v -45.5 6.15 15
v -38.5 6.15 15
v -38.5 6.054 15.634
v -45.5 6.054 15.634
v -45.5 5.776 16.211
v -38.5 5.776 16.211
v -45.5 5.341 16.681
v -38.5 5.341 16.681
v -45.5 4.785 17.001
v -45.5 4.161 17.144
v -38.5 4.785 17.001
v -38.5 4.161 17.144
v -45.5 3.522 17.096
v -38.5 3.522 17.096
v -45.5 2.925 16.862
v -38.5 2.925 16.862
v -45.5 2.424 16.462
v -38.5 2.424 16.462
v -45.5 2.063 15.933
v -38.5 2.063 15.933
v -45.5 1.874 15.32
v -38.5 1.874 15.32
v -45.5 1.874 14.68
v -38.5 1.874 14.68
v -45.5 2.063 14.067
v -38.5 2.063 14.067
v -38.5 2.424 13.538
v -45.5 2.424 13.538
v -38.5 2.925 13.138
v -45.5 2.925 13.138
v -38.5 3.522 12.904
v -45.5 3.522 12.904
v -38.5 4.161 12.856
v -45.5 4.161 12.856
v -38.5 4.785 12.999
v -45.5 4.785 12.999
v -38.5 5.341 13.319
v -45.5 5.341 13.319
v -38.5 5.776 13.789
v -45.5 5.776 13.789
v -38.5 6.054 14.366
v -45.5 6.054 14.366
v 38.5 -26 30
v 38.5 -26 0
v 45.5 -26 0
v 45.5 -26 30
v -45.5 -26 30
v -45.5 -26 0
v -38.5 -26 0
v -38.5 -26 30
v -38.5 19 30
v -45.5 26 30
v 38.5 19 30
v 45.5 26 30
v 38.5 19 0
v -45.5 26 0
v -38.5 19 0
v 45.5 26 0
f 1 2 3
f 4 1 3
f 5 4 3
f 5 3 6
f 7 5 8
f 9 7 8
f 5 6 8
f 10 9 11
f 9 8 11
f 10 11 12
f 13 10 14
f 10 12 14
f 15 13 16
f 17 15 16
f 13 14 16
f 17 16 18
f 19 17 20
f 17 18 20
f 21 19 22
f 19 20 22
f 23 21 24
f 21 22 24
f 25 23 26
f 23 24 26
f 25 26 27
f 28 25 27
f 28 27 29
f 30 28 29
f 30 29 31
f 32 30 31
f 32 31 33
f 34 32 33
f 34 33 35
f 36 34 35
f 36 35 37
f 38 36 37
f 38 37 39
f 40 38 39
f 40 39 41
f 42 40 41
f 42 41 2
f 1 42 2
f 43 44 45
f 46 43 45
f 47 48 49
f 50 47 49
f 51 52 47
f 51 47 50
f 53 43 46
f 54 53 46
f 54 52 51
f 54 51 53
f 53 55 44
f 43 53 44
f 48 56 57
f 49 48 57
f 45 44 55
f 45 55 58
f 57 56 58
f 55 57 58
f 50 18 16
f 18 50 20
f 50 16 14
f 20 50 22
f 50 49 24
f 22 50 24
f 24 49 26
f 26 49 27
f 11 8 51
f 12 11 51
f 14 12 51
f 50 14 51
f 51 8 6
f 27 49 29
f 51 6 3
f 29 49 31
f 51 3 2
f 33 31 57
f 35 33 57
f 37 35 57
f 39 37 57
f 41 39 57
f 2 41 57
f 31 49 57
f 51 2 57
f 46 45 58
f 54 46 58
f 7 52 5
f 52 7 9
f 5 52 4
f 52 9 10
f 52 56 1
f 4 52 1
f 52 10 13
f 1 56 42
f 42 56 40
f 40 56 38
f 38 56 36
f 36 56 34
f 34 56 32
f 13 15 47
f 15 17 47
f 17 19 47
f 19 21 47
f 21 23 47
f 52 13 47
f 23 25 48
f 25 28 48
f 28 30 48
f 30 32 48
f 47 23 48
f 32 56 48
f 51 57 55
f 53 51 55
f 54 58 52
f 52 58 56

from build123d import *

# Parameters (mm, degrees)
F1_DEPTH = 30
F3_D     = 4.3
F3_DEPTH = 10


with BuildPart() as f1:
    # F0 (on Top) → F1 (new body)
    with BuildSketch(Plane.XY):
        Polygon((45.5, 26), (-45.5, 26), (-45.5, -26), (-38.5, -26), (-38.5, 19), (38.5, 19), (38.5, -26), (45.5, -26), align=None)
    extrude(amount=F1_DEPTH)

    # F3
    with Locations(Plane(origin=(-45.5, 0, 0), x_dir=(0, -1, 0), z_dir=(-1, 0, 0))):
        with Locations((-4, 15)):
            Hole(F3_D / 2, depth=F3_DEPTH)


solid = f1.part
